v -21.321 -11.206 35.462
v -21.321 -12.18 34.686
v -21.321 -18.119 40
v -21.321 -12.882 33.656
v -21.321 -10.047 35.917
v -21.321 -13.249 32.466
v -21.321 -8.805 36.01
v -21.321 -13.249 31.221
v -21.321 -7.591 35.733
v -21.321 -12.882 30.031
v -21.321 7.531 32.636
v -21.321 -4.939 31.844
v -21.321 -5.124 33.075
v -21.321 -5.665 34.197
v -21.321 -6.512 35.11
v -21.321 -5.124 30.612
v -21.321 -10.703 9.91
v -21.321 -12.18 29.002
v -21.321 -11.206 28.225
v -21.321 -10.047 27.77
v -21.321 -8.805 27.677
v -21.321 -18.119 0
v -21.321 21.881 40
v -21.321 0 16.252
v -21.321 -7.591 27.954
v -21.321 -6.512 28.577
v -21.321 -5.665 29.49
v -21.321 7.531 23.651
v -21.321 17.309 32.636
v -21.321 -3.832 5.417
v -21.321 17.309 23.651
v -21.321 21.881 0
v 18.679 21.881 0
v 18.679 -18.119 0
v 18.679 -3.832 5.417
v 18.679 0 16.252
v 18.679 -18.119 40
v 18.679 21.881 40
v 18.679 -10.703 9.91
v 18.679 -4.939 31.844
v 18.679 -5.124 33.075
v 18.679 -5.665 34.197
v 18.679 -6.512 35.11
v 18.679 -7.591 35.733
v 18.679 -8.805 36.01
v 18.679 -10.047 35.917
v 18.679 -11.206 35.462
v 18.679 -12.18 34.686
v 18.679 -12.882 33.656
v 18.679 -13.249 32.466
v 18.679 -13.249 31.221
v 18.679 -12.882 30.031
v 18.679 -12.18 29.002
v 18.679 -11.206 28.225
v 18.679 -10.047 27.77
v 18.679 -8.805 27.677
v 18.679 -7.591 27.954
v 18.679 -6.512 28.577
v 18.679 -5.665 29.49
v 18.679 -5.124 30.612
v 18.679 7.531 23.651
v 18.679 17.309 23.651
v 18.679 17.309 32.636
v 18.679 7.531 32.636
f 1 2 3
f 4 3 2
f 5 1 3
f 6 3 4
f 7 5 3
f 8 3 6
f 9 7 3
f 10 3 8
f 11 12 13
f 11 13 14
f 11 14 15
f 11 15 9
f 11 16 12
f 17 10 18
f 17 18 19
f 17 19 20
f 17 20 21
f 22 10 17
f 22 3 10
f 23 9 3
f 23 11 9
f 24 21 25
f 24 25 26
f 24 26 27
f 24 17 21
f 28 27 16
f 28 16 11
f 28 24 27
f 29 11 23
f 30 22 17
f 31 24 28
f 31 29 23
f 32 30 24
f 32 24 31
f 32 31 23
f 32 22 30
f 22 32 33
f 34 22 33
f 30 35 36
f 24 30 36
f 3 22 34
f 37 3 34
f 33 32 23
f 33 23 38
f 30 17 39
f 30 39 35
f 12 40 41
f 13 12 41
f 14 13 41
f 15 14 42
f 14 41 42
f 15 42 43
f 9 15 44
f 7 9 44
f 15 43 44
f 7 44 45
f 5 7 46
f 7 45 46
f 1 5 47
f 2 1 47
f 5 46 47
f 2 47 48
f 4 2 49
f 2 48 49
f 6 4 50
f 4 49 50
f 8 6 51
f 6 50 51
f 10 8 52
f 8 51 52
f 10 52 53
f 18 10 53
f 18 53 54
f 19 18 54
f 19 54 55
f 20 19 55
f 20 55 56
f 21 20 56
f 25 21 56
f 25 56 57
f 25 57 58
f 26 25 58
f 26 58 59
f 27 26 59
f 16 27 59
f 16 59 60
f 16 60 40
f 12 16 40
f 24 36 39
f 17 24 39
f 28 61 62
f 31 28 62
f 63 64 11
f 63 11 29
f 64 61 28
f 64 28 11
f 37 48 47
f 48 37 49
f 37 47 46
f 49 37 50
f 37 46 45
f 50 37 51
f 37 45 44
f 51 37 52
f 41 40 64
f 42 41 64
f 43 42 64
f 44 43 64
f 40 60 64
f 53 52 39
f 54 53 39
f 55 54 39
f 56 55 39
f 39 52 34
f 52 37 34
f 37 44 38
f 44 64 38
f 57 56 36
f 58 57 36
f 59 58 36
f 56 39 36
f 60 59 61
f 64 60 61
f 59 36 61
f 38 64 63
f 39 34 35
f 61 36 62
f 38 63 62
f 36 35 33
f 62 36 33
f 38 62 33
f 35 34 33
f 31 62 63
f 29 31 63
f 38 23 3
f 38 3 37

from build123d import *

# Parameters (mm, degrees)
F0_W     = 40
F0_H     = 40
F1_DEPTH = 25
F2_DEPTH = 40
F3_R     = 4.178344
F3_W     = 9.777684
F3_H     = 8.984899
F4_DEPTH = 40.001


with BuildPart() as f1:
    # F0 (on Top) → F1 (new body)
    with BuildSketch(Plane.XY):
        with Locations((-1.321308, 1.88122)):
            Rectangle(F0_W, F0_H)
    extrude(amount=F1_DEPTH)

    # F0 (on Top) → F2 (join)
    with BuildSketch(Plane.XY):
        with Locations((-1.321308, 1.88122)):
            Rectangle(F0_W, F0_H)
    extrude(amount=F2_DEPTH)

    # F3 (on face) → F4 (cut, through all)
    with BuildSketch(Plane.YZ.offset(18.678692)):
        with Locations((-9.117031, 31.843539)):
            Circle(F3_R)
        with Locations((12.420302, 28.143876)):
            Rectangle(F3_W, F3_H)
        Polygon((0, 16.252099), (-10.702601, 9.909815), (-3.831795, 5.417366), align=None)
    extrude(amount=-F4_DEPTH, mode=Mode.SUBTRACT)


solid = f1.part
